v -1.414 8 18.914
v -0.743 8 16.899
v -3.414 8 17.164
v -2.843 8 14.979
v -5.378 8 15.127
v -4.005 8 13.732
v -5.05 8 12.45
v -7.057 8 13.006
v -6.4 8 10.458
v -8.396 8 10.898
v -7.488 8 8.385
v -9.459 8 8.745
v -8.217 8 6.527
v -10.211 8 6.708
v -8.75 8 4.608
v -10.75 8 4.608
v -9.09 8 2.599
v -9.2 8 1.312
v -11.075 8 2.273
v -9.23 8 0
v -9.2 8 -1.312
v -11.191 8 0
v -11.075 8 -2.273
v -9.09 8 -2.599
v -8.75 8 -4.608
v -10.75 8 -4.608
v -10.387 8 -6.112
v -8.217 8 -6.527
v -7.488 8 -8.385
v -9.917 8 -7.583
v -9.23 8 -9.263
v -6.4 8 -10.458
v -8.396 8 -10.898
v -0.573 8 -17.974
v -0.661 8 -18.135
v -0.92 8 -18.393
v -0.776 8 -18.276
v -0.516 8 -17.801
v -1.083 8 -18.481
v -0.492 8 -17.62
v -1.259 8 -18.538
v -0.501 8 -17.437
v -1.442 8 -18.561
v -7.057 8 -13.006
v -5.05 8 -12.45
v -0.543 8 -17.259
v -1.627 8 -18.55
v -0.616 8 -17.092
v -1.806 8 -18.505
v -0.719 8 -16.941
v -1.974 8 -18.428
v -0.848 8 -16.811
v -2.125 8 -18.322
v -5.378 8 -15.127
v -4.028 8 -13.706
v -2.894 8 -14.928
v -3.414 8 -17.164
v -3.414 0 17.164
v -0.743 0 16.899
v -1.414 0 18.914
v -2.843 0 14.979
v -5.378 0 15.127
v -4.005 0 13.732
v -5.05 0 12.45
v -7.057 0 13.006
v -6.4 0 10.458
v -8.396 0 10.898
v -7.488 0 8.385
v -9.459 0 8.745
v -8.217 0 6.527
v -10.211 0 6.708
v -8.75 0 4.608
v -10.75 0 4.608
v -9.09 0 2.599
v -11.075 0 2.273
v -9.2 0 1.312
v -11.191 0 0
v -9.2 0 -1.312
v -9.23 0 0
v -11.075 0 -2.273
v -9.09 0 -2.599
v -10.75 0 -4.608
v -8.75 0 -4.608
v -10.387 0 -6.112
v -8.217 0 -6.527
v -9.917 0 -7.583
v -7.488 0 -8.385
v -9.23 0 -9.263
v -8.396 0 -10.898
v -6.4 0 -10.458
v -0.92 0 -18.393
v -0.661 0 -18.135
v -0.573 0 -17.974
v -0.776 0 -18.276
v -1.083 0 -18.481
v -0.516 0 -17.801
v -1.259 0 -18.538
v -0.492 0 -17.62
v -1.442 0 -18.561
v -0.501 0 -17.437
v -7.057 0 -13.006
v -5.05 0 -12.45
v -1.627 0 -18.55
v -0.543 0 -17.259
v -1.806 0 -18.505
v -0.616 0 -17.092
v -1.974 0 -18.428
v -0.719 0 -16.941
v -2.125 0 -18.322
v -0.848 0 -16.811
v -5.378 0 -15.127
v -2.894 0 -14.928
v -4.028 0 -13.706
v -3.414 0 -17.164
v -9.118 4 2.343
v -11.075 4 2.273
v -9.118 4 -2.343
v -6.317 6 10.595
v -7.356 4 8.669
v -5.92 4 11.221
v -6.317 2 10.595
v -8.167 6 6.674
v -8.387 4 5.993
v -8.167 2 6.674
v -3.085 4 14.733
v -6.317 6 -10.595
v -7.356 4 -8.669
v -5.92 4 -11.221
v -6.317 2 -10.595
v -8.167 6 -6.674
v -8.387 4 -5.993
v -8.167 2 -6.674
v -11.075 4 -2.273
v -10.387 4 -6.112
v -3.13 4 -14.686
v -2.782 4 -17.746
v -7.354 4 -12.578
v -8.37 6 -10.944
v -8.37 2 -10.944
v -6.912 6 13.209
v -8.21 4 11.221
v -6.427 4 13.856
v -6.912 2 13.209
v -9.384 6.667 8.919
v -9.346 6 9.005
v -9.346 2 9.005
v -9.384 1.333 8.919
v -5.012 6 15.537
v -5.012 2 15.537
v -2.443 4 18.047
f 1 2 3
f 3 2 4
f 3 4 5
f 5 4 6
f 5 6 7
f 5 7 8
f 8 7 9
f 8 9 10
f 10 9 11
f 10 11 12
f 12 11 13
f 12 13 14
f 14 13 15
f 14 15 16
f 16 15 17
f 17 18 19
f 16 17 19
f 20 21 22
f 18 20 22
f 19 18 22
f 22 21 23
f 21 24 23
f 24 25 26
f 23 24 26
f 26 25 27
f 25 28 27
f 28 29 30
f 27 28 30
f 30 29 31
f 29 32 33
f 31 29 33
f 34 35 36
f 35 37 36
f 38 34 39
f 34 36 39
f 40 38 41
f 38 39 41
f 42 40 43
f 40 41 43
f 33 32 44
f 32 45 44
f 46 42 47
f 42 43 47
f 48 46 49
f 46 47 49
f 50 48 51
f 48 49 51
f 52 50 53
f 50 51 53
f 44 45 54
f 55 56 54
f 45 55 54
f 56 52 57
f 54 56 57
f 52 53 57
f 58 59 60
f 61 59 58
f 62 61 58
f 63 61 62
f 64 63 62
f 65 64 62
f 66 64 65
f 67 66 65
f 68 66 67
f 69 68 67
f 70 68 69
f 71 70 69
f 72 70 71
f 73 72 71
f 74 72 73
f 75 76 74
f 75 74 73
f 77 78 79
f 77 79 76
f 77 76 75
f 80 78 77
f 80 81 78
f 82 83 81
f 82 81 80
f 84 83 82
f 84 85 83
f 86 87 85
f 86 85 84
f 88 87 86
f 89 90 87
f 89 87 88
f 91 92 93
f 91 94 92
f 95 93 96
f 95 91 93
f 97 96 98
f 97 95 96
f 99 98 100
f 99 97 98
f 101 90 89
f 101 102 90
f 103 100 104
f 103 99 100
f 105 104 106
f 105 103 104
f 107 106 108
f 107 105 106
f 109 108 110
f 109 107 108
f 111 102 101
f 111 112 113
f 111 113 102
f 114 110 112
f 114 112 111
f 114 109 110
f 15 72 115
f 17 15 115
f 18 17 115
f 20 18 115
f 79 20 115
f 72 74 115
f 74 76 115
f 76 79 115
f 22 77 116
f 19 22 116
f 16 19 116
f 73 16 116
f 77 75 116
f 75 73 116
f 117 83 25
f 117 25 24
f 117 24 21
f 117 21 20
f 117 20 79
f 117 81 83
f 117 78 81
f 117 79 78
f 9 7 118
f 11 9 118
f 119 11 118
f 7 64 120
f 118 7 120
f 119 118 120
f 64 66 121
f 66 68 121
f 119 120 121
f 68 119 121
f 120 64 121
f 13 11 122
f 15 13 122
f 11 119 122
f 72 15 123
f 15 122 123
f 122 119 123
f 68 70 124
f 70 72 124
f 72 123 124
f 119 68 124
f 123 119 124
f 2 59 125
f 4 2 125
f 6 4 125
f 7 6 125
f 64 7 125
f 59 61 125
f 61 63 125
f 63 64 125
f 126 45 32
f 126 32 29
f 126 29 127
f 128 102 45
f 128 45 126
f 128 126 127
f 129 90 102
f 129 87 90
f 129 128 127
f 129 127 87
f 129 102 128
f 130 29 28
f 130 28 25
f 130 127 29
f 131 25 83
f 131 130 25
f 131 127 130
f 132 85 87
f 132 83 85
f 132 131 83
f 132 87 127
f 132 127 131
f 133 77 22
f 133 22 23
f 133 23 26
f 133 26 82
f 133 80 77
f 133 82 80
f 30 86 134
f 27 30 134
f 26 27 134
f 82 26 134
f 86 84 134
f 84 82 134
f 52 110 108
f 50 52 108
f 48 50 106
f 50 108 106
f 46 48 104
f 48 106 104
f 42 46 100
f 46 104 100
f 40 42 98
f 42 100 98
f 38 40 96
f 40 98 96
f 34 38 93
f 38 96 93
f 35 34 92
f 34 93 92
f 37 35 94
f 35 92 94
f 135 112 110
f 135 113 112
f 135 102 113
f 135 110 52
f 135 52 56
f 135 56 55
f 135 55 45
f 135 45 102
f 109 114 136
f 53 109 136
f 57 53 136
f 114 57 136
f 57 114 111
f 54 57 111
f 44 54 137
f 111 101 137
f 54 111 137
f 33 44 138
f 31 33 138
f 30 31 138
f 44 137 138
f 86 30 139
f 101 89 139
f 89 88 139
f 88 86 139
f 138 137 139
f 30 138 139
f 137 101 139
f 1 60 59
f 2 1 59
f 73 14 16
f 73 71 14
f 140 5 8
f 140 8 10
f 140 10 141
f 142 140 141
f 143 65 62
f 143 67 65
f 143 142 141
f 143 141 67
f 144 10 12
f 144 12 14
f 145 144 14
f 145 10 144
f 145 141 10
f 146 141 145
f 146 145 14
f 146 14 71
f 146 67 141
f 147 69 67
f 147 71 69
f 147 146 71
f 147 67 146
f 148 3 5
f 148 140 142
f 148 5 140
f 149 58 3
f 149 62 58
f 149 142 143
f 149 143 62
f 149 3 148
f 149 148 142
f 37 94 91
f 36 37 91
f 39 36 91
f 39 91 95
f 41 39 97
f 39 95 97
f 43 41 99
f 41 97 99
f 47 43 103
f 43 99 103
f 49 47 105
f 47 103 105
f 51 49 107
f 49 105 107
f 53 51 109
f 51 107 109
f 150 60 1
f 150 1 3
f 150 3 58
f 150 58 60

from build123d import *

# Parameters (mm, degrees)
EXTRUDE_1_DEPTH = 8
FILLET_2_R      = 1


with BuildPart() as part:
    # 草图1 → 凸台-拉伸1 (new body)
    with BuildSketch(Plane(origin=(0, 0, 0), x_dir=(1, 0, 0), z_dir=(0, 1, 0))):
        with BuildLine():
            add(Edge.make_bspline(
                [(0, 17.5), (-3.018559866, 15.126656034), (-5.050027734, 12.449972293)],
                knots=[0, 0, 0, 0.266241411, 0.266241411, 0.266241411], degree=2))
            ThreePointArc((0, 17.5), (-1.715353459, 17.415727447), (-3.414186094, 17.16372143))
            add(Edge.make_bspline(
                [(-3.414186094, 17.16372143), (-8.043161647, 12.78312826), (-9.916919162, 7.583080838)],
                knots=[0.089180087, 0.089180087, 0.089180087, 0.527021845, 0.527021845, 0.527021845], degree=2))
            add(Edge.make_bspline(
                [(-9.916919162, 7.583080838), (-10.441389168, 6.127572919), (-10.75, 4.607864376)],
                knots=[0.527021845, 0.527021845, 0.527021845, 0.649574986, 0.649574986, 0.649574986], degree=2))
            add(Edge.make_bspline(
                [(-11.190859313, 0), (-11.178661457, 2.24200009), (-10.75, 4.607864376)],
                knots=[0.829773285, 0.829773285, 0.829773285, 1, 1, 1], degree=2))
            add(Edge.make_bspline(
                [(-11.190859313, 0), (-11.178661457, -2.24200009), (-10.75, -4.607864376)],
                knots=[0.829773285, 0.829773285, 0.829773285, 1, 1, 1], degree=2))
            add(Edge.make_bspline(
                [(-3.414186094, -17.16372143), (-9.338824941, -11.556987894), (-10.75, -4.607864376)],
                knots=[0.089180087, 0.089180087, 0.089180087, 0.649574986, 0.649574986, 0.649574986], degree=2))
            ThreePointArc((-3.414186094, -17.16372143), (-2.179900554, -17.36369873), (-0.934486298, -17.47503177))
            Line((-0.934486298, -17.47503177), (-0.742530402, -16.899164082))
            add(Edge.make_bspline(
                [(-0.742530402, -16.899164082), (-3.273656048, -14.790538581), (-5.050027734, -12.449972293)],
                knots=[0.033432558, 0.033432558, 0.033432558, 0.266241411, 0.266241411, 0.266241411], degree=2))
            add(Edge.make_bspline(
                [(-5.050027734, -12.449972293), (-7.812978864, -8.809478401), (-8.75, -4.607864376)],
                knots=[0.266241411, 0.266241411, 0.266241411, 0.628350021, 0.628350021, 0.628350021], degree=2))
            add(Edge.make_bspline(
                [(-8.75, -4.607864376), (-9.246260347, -2.382627023), (-9.23036206, 0)],
                knots=[0.628350021, 0.628350021, 0.628350021, 0.820128134, 0.820128134, 0.820128134], degree=2))
            add(Edge.make_bspline(
                [(-8.75, 4.607864376), (-9.246260347, 2.382627023), (-9.23036206, 0)],
                knots=[0.628350021, 0.628350021, 0.628350021, 0.820128134, 0.820128134, 0.820128134], degree=2))
            add(Edge.make_bspline(
                [(-5.050027734, 12.449972293), (-7.812978864, 8.809478401), (-8.75, 4.607864376)],
                knots=[0.266241411, 0.266241411, 0.266241411, 0.628350021, 0.628350021, 0.628350021], degree=2))
        make_face()
        with BuildLine():
            ThreePointArc((-3.414186094, 17.16372143), (-1.715353459, 17.415727447), (0, 17.5))
            Line((0, 17.5), (-1.414213562, 18.914213562))
            add(Edge.make_bspline(
                [(-1.414213562, 18.914213562), (-2.471351299, 18.05596543), (-3.414186094, 17.16372143)],
                knots=[0, 0, 0, 0.089180087, 0.089180087, 0.089180087], degree=2))
        make_face()
        with BuildLine():
            add(Edge.make_bspline(
                [(-1.414213562, -18.914213562), (-2.471351299, -18.05596543), (-3.414186094, -17.16372143)],
                knots=[0, 0, 0, 0.089180087, 0.089180087, 0.089180087], degree=2))
            Line((-1.414213562, -18.914213562), (-0.934486298, -17.47503177))
            ThreePointArc((-0.934486298, -17.47503177), (-2.179900554, -17.36369873), (-3.414186094, -17.16372143))
        make_face()
    extrude(amount=EXTRUDE_1_DEPTH)

    # 圆角2
    # the kernel refuses this fillet: 1 mm, written as the material it takes off along each edge
    with BuildSketch(Plane(origin=(-1.414213562, 0, -18.914213562), x_dir=(0.7071067811865474, 0, 0.7071067811865478), z_dir=(0, 1, 0))) as fillet_2_piece_1:
        with BuildLine():
            CenterArc((0.912847355, -1), FILLET_2_R, 90, 85.515704576)
            Line((-0.084091447, -0.921814159), (-0.104030223, -0.920250442))
            ThreePointArc((-0.104030223, -0.920250442), (-0.06486668, -0.458824048), (-0.019893041, 0.002065651))
            Line((-0.019893041, 0.002065651), (0, 0.02))
            Line((0, 0.02), (0.912847355, 0.02))
            Line((0.912847355, 0.02), (0.912847355, 0))
        make_face()
    extrude(amount=8, mode=Mode.SUBTRACT)
    with BuildSketch(Plane(origin=(0, 0, -17.5), x_dir=(-0.7760833502518973, 0, 0.6306303461313852), z_dir=(0, 1, 0))) as fillet_2_piece_2:
        with BuildLine():
            CenterArc((1.108716697, -0.99986523), FILLET_2_R, 90.940675656, 94.962680688)
            Line((0.114019904, -1.102716035), (0.094125968, -1.104773051))
            Line((0.094125968, -1.104773051), (-0.019893936, -0.002057016))
            Line((-0.019893936, -0.002057016), (0.000321277, 0.019997419))
            ThreePointArc((0.000321277, 0.019997419), (0.546151149, 0.015565202), (1.091971205, 0.019997305))
            Line((1.091971205, 0.019997305), (1.092299548, 0))
        make_face()
    extrude(amount=8, mode=Mode.SUBTRACT)


solid = part.part
